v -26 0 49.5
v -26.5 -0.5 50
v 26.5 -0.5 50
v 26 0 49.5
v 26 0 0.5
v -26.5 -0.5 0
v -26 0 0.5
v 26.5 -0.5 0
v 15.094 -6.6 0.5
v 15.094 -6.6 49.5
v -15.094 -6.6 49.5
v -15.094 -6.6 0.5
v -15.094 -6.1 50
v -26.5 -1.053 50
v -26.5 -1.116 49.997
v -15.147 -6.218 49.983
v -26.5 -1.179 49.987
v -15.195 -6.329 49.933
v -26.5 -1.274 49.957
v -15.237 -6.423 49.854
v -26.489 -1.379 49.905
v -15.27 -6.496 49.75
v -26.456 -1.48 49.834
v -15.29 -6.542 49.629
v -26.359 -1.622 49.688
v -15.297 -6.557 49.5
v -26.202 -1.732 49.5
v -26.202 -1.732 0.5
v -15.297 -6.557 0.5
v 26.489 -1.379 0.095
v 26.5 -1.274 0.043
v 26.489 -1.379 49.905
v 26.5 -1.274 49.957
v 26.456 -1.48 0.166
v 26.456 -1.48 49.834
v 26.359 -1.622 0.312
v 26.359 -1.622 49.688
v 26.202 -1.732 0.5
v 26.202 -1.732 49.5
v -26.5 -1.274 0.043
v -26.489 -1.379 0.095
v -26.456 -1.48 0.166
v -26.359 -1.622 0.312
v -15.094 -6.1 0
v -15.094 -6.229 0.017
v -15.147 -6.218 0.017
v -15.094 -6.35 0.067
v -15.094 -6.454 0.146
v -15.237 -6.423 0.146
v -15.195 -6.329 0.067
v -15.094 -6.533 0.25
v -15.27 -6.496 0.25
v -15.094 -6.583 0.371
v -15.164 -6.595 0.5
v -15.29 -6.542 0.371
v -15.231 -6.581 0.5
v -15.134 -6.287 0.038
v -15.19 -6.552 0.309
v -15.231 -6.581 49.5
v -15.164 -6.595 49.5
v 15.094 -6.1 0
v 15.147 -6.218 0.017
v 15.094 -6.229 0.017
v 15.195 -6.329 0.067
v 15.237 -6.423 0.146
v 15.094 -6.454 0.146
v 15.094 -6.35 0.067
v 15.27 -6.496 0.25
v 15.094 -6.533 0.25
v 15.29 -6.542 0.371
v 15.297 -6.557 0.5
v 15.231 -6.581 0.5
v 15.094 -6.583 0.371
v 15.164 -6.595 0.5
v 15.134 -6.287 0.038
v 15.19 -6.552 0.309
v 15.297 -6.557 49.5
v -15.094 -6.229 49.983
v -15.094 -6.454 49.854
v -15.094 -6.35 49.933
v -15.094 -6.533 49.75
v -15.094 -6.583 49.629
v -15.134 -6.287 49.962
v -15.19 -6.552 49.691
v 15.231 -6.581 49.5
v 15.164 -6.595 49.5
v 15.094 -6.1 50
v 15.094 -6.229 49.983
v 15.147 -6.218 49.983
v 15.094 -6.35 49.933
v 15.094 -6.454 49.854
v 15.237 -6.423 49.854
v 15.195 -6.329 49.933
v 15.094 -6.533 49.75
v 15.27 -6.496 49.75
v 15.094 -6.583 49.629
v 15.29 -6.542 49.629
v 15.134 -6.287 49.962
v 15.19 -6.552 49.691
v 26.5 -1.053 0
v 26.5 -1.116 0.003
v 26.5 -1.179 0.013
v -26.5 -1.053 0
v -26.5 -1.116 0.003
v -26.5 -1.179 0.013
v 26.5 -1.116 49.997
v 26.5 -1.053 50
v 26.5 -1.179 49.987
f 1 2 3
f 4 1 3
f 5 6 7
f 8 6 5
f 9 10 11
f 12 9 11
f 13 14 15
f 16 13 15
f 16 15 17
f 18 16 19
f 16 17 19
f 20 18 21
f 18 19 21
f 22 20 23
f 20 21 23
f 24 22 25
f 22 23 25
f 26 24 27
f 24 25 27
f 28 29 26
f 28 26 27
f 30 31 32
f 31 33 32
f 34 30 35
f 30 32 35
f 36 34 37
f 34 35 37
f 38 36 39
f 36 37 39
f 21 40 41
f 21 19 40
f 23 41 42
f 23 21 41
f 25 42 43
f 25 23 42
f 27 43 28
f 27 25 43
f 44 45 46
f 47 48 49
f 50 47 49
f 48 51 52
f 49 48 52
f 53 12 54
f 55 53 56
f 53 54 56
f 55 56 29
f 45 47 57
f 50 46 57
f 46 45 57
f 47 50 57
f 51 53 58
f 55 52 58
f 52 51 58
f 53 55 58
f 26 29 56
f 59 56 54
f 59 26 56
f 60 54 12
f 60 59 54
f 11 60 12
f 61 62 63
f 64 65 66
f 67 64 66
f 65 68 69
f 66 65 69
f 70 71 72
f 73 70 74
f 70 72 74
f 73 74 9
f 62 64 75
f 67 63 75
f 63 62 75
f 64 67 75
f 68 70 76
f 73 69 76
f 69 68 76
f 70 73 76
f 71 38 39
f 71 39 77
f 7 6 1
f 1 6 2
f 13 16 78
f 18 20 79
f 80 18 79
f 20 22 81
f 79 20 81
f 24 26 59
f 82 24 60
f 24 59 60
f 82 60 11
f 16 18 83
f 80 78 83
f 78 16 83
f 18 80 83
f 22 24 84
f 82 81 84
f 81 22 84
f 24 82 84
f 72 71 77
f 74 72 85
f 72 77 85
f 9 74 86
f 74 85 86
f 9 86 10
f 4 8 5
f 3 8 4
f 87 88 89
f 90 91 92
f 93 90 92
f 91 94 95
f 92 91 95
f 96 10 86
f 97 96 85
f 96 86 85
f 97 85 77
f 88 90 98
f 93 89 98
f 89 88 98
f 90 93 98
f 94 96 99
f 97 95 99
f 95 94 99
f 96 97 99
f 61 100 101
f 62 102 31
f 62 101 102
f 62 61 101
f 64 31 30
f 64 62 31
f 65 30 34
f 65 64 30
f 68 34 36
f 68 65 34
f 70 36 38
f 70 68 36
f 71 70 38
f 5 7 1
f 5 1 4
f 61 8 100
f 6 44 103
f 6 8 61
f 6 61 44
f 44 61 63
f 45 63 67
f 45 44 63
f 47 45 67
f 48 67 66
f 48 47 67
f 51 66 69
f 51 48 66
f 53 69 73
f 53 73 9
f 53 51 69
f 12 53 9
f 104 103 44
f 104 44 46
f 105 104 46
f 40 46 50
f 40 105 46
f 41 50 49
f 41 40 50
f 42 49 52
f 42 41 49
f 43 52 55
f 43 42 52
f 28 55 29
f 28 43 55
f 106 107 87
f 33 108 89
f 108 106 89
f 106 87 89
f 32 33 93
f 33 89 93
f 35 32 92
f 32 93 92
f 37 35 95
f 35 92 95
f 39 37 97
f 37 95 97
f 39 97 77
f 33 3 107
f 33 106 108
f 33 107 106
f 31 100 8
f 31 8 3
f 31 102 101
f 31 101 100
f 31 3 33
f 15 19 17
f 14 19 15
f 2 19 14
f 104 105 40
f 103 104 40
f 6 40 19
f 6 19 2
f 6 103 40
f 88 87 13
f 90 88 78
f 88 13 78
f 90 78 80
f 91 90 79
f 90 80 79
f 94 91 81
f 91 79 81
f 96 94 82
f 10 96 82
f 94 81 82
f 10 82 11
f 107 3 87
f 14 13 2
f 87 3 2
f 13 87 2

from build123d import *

# Parameters (mm, degrees)
EXTRUDE_1_DEPTH = 50
CHAMFER_1_SIZE  = 0.5
FILLET_1_R      = 0.5


with BuildPart() as part:
    # Эскиз1 → Бобышка-Вытянуть1 (new body)
    with BuildSketch(Plane.XY):
        Polygon((-26.5, 0), (26.5, 0), (26.5, -1.6), (15.2, -6.6), (-15.2, -6.6), (-26.5, -1.6), align=None)
    extrude(amount=EXTRUDE_1_DEPTH)

    # Фаска1
    chamfer_1_edges = [part.edges().sort_by_distance(p)[0] for p in [
        (-26.5, 0, 25),
        (26.5, 0, 25),
        (0, 0, 0),
        (0, 0, 50),
    ]]
    chamfer(chamfer_1_edges, length=CHAMFER_1_SIZE)

    # Скругление1
    fillet_1_edges = [part.edges().sort_by_distance(p)[0] for p in [
        (26.5, -1.6, 25),
        (15.2, -6.6, 25),
        (-15.2, -6.6, 25),
        (-26.5, -1.6, 25),
        (-20.85, -4.1, 50),
        (0, -6.6, 50),
        (20.85, -4.1, 50),
        (20.85, -4.1, 0),
        (0, -6.6, 0),
        (-20.85, -4.1, 0),
    ]]
    fillet(fillet_1_edges, radius=FILLET_1_R)


solid = part.part
